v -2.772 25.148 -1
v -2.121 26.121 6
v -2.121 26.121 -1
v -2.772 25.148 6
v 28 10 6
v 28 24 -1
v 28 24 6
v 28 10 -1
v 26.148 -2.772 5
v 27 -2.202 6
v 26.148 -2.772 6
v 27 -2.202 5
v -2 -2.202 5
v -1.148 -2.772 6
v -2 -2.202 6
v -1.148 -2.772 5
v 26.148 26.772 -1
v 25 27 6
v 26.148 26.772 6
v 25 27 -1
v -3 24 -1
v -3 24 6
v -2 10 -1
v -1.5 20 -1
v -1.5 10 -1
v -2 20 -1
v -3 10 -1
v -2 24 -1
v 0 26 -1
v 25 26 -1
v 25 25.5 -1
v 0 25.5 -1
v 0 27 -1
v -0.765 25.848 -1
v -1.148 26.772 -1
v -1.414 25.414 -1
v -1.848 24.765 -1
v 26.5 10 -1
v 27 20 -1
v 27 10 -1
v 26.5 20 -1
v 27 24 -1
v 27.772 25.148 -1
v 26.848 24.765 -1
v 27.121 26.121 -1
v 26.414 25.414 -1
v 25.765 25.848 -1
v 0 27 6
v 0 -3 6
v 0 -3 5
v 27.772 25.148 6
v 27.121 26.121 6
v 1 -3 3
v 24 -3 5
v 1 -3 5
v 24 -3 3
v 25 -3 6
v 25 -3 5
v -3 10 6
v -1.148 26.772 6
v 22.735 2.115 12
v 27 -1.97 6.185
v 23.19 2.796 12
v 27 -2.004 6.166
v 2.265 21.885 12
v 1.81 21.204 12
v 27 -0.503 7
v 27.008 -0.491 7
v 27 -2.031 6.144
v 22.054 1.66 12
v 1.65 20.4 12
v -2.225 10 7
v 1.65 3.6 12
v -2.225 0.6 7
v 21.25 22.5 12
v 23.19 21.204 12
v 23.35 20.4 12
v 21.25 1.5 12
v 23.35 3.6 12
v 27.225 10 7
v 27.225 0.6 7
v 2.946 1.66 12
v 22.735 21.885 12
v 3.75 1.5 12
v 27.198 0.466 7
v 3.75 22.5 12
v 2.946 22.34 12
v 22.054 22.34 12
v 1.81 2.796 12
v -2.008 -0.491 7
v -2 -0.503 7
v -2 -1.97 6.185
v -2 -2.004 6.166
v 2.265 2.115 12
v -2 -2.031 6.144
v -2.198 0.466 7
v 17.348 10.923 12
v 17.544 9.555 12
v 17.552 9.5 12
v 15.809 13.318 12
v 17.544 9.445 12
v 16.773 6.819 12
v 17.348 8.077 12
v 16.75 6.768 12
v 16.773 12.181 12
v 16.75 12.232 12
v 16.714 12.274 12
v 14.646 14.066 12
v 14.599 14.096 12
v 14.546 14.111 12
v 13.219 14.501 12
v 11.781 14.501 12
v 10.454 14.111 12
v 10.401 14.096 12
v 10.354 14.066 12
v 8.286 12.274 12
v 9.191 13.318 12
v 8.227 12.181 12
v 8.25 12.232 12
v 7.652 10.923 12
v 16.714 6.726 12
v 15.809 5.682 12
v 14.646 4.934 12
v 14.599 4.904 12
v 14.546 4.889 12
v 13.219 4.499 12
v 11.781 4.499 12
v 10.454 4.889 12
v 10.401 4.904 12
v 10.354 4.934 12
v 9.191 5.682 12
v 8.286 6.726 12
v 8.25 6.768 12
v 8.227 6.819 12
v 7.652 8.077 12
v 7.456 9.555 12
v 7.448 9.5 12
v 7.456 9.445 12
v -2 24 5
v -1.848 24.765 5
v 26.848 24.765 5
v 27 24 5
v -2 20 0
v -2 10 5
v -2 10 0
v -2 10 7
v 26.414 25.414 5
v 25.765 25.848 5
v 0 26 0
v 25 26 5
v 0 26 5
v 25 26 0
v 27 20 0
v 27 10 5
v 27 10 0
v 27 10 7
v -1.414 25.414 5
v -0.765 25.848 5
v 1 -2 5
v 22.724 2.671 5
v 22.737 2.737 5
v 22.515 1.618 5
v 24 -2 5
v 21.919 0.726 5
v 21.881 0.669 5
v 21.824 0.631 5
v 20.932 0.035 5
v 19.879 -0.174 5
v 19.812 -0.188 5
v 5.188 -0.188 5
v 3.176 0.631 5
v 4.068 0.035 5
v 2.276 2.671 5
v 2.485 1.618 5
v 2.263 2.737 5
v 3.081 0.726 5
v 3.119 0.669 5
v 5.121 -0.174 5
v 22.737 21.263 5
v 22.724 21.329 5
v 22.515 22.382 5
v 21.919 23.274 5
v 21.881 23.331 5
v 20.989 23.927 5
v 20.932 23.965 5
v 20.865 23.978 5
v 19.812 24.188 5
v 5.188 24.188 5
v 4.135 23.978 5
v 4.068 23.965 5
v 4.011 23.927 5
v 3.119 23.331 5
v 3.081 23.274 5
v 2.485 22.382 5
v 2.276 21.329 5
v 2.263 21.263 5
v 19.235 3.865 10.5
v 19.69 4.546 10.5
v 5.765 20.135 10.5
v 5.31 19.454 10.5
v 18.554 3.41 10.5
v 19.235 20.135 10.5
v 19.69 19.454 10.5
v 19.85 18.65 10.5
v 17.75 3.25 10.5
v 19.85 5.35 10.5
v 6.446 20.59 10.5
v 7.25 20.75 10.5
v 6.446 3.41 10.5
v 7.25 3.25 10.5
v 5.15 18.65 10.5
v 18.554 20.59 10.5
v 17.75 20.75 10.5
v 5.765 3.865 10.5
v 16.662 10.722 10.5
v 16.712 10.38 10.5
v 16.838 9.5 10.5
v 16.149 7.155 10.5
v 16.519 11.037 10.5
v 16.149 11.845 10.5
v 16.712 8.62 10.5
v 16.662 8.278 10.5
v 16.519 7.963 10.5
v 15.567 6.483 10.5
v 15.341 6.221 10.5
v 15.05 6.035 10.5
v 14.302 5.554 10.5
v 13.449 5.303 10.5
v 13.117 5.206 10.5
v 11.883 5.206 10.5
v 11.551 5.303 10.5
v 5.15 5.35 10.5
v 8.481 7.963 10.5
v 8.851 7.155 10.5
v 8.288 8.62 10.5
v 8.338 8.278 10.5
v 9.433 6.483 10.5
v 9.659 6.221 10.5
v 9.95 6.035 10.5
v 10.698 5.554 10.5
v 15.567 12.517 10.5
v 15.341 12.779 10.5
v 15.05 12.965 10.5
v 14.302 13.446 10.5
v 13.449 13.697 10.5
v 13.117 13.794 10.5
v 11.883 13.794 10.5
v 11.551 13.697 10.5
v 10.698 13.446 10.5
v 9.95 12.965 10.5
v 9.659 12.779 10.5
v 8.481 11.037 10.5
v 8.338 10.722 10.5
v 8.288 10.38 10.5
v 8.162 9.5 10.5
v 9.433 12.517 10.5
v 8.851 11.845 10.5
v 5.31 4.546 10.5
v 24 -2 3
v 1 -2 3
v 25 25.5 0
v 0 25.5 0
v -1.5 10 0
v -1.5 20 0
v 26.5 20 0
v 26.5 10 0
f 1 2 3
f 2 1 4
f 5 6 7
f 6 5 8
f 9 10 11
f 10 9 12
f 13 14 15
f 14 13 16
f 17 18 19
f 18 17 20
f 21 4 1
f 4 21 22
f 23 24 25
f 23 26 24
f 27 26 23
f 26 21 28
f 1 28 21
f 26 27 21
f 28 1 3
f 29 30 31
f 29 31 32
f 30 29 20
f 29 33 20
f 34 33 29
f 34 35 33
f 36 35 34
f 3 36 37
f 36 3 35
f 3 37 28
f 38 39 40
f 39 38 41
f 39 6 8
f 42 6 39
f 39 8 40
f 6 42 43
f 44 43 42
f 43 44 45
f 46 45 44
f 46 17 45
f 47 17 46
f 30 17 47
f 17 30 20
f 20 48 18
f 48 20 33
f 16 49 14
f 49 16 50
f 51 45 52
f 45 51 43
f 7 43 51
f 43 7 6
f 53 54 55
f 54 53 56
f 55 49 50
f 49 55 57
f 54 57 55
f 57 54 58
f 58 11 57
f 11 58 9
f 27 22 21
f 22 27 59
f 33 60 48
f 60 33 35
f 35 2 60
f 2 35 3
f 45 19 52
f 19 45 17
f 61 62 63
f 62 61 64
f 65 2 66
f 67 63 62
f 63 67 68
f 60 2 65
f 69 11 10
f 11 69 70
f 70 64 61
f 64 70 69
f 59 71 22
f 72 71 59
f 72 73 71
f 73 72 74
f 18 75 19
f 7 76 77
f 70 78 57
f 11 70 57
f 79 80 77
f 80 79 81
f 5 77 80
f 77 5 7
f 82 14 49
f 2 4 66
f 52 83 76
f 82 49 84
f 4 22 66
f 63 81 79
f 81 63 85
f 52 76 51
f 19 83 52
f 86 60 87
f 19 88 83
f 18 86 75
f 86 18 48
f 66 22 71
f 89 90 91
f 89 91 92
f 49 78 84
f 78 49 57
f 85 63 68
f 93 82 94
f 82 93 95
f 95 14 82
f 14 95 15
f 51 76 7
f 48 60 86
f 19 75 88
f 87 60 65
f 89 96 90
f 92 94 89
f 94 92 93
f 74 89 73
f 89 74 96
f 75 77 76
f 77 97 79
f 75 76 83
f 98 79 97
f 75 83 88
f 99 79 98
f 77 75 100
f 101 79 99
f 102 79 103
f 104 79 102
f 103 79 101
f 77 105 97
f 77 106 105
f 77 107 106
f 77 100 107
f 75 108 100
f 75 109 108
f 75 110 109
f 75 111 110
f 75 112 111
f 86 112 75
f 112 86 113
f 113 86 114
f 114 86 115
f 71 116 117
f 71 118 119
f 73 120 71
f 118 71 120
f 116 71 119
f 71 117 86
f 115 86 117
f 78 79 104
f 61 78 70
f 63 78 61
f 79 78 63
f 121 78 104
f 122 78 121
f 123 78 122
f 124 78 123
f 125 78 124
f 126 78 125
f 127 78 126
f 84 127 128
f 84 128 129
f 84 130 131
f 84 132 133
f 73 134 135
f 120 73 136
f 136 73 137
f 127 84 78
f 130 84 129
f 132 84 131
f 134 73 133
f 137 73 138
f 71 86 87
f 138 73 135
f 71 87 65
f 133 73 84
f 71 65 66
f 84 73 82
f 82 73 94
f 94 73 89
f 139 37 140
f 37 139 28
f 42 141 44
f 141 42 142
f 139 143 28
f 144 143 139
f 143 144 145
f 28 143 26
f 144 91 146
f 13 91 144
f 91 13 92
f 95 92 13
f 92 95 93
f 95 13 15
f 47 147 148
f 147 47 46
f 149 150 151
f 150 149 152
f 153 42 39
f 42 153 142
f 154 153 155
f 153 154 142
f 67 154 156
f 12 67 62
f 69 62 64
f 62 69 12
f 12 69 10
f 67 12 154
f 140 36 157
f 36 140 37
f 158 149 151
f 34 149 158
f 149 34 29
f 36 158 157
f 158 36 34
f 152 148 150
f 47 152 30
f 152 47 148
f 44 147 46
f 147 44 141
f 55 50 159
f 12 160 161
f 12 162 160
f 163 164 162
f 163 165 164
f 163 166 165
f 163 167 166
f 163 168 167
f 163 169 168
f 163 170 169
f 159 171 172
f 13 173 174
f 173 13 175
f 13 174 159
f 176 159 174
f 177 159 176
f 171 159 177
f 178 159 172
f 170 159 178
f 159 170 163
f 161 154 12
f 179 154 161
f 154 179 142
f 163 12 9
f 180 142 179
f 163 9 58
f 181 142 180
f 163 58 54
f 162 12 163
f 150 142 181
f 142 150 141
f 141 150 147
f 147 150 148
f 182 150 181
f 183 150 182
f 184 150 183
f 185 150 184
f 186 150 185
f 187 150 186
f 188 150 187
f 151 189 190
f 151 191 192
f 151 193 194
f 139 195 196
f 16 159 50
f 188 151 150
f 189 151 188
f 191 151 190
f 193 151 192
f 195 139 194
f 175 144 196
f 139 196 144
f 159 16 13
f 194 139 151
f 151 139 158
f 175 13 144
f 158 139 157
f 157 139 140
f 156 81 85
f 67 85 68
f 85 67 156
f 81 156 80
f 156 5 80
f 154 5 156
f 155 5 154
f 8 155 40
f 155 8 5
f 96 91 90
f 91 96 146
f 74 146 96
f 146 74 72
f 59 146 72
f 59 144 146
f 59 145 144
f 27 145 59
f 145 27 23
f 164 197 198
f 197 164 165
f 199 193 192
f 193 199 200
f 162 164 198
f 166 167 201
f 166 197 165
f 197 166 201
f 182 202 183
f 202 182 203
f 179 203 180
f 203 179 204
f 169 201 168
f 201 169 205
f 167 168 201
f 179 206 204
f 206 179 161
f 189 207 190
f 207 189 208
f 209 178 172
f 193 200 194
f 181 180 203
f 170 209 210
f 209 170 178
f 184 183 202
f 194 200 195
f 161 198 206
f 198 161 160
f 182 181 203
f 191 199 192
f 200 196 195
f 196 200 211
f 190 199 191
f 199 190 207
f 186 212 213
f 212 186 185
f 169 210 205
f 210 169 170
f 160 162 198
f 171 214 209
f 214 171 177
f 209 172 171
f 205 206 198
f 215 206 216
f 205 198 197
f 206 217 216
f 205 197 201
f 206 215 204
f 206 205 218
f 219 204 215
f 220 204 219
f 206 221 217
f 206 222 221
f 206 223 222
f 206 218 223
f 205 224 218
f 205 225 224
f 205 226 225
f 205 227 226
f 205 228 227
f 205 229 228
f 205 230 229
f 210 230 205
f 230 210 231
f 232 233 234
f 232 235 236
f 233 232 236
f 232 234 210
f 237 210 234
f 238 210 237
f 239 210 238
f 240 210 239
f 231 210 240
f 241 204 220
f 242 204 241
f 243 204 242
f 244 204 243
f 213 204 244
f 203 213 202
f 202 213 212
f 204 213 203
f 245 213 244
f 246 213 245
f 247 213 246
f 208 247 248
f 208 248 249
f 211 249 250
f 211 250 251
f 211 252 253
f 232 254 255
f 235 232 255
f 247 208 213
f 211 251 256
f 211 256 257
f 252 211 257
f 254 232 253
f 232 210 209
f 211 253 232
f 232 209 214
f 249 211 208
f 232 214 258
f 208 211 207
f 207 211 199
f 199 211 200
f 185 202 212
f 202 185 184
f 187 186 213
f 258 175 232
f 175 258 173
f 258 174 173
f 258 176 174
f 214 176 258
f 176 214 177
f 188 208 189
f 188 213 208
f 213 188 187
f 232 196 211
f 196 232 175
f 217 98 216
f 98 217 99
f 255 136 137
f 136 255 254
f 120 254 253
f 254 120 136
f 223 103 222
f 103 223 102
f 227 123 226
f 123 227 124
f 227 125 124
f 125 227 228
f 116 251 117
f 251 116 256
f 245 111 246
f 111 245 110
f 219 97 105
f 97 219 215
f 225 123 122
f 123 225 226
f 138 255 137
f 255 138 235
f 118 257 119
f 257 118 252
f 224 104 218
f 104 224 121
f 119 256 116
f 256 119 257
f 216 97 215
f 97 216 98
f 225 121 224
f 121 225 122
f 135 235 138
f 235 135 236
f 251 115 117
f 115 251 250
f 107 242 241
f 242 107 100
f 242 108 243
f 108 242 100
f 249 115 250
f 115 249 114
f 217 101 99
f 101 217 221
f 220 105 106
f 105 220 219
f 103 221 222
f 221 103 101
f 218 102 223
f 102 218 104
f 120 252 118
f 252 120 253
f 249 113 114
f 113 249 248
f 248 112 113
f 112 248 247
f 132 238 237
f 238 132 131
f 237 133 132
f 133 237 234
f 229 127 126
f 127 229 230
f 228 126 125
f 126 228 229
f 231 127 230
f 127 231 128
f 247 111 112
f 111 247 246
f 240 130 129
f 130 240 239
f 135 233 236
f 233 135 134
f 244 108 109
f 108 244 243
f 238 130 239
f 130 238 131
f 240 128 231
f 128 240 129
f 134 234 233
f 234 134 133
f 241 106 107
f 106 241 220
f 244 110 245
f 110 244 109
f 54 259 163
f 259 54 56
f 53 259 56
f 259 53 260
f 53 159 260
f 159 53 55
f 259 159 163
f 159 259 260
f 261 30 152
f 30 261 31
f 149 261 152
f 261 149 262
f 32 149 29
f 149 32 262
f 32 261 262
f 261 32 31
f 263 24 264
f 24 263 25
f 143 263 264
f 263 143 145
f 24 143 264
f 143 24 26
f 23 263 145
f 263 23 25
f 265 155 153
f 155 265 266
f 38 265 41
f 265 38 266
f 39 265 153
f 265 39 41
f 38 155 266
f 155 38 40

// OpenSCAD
// file: Mcam1a.scad
// Mcam1a.scad
// This is the back for the camera



module shell(){
    
// main shell
difference(){
    color("yellow")
    linear_extrude(height=5)
    offset(r=2,$fn=16)    
    square(size=[25,24]);

    translate([0,0,1])
    color("orange")
    linear_extrude(height=5)
    offset(r=0.1,$fn=16)    
    square(size=[25,24]);

    translate([4,-3,1])
    color("green")
    cube([17,5,5]);

}

// posts to support PCB
translate([2.0,9.5,1]){
    cylinder(r=2,h=3,$fn=16);
    cylinder(r=0.8,h=4,$fn=16);
}
translate([2.0,22,1]){
    cylinder(r=2,h=3,$fn=16);
    cylinder(r=0.8,h=4,$fn=16);
}
translate([23.0,9.5,1]){
    cylinder(r=2,h=3,$fn=16);
    cylinder(r=0.8,h=4,$fn=16);
}
translate([23.0,22,1]){
    cylinder(r=2,h=3,$fn=16);
    cylinder(r=0.8,h=4,$fn=16);
}

// pivots on sides to mount
translate([-5,4,2.5])
color("pink")
rotate([0,90,0])
cylinder(r1=2,r2=2.25,h=3,$fn=12);

translate([30,4,2.5])
color("pink")
rotate([0,-90,0])
cylinder(r1=2,r2=2.25,h=3,$fn=12);


} // end module shell

shell();
// main file
// Mcam1c.scad
// This is the front plate
use <Mcam1a.scad>

difference(){
union(){
    // main boss
    translate([0,0,-1])
    color("yellow")
    linear_extrude(height=7)
    offset(r=3,$fn=16)    
    square(size=[25,24]);

    // camera bump boss
    translate([12.5,12,6])
    color("green")
    linear_extrude(height=6,scale=0.70)
    offset(r=3,$fn=16)
    square([25,24],center=true);

}
    // main boss cutout
    translate([0,0,-2])
    color("orange")
    linear_extrude(height=7)
    offset(r=2,$fn=16)    
    square(size=[25,24]);

    // side cuts for articulation
    translate([27,-4,-3])
    color("green")
    cube([5,14,10]);

    translate([-7,-4,-3])
    color("green")
    cube([5,14,10]);

    // bottom cut for cable
    translate([-5,-4,-1])
    color("green")
    cube([35,4,6]);

    // hollow out the camera bump
    translate([12.5,12,4.5])
    color("green")
    linear_extrude(height=6,scale=0.70)
    offset(r=3,$fn=16)
    square([15,19],center=true);

    // hole for the lens
    translate([12.5,9.5,10])
    color("cyan")
//   linear_extrude(height=2.1,scale=1.2)
//    offset(r=3,$fn=16)
//    square([4,4],center=true);
    cylinder(r1=4.1,r2=5.1,h=2.1,$fn=22);
}

    // tab near cable
    translate([1,-3,3])
    color("pink")
    cube([23,1,2]);

    // tab topside
    translate([0,25.5,-1])
    color("cyan")
    cube([25,0.5,1]);

    // tab left
    translate([-2.0,10,-1])
    color("cyan")
    cube([0.5,10,1]);

    // tab right
    translate([26.5,10,-1])
    color("cyan")
    cube([0.5,10,1]);





//shell();
